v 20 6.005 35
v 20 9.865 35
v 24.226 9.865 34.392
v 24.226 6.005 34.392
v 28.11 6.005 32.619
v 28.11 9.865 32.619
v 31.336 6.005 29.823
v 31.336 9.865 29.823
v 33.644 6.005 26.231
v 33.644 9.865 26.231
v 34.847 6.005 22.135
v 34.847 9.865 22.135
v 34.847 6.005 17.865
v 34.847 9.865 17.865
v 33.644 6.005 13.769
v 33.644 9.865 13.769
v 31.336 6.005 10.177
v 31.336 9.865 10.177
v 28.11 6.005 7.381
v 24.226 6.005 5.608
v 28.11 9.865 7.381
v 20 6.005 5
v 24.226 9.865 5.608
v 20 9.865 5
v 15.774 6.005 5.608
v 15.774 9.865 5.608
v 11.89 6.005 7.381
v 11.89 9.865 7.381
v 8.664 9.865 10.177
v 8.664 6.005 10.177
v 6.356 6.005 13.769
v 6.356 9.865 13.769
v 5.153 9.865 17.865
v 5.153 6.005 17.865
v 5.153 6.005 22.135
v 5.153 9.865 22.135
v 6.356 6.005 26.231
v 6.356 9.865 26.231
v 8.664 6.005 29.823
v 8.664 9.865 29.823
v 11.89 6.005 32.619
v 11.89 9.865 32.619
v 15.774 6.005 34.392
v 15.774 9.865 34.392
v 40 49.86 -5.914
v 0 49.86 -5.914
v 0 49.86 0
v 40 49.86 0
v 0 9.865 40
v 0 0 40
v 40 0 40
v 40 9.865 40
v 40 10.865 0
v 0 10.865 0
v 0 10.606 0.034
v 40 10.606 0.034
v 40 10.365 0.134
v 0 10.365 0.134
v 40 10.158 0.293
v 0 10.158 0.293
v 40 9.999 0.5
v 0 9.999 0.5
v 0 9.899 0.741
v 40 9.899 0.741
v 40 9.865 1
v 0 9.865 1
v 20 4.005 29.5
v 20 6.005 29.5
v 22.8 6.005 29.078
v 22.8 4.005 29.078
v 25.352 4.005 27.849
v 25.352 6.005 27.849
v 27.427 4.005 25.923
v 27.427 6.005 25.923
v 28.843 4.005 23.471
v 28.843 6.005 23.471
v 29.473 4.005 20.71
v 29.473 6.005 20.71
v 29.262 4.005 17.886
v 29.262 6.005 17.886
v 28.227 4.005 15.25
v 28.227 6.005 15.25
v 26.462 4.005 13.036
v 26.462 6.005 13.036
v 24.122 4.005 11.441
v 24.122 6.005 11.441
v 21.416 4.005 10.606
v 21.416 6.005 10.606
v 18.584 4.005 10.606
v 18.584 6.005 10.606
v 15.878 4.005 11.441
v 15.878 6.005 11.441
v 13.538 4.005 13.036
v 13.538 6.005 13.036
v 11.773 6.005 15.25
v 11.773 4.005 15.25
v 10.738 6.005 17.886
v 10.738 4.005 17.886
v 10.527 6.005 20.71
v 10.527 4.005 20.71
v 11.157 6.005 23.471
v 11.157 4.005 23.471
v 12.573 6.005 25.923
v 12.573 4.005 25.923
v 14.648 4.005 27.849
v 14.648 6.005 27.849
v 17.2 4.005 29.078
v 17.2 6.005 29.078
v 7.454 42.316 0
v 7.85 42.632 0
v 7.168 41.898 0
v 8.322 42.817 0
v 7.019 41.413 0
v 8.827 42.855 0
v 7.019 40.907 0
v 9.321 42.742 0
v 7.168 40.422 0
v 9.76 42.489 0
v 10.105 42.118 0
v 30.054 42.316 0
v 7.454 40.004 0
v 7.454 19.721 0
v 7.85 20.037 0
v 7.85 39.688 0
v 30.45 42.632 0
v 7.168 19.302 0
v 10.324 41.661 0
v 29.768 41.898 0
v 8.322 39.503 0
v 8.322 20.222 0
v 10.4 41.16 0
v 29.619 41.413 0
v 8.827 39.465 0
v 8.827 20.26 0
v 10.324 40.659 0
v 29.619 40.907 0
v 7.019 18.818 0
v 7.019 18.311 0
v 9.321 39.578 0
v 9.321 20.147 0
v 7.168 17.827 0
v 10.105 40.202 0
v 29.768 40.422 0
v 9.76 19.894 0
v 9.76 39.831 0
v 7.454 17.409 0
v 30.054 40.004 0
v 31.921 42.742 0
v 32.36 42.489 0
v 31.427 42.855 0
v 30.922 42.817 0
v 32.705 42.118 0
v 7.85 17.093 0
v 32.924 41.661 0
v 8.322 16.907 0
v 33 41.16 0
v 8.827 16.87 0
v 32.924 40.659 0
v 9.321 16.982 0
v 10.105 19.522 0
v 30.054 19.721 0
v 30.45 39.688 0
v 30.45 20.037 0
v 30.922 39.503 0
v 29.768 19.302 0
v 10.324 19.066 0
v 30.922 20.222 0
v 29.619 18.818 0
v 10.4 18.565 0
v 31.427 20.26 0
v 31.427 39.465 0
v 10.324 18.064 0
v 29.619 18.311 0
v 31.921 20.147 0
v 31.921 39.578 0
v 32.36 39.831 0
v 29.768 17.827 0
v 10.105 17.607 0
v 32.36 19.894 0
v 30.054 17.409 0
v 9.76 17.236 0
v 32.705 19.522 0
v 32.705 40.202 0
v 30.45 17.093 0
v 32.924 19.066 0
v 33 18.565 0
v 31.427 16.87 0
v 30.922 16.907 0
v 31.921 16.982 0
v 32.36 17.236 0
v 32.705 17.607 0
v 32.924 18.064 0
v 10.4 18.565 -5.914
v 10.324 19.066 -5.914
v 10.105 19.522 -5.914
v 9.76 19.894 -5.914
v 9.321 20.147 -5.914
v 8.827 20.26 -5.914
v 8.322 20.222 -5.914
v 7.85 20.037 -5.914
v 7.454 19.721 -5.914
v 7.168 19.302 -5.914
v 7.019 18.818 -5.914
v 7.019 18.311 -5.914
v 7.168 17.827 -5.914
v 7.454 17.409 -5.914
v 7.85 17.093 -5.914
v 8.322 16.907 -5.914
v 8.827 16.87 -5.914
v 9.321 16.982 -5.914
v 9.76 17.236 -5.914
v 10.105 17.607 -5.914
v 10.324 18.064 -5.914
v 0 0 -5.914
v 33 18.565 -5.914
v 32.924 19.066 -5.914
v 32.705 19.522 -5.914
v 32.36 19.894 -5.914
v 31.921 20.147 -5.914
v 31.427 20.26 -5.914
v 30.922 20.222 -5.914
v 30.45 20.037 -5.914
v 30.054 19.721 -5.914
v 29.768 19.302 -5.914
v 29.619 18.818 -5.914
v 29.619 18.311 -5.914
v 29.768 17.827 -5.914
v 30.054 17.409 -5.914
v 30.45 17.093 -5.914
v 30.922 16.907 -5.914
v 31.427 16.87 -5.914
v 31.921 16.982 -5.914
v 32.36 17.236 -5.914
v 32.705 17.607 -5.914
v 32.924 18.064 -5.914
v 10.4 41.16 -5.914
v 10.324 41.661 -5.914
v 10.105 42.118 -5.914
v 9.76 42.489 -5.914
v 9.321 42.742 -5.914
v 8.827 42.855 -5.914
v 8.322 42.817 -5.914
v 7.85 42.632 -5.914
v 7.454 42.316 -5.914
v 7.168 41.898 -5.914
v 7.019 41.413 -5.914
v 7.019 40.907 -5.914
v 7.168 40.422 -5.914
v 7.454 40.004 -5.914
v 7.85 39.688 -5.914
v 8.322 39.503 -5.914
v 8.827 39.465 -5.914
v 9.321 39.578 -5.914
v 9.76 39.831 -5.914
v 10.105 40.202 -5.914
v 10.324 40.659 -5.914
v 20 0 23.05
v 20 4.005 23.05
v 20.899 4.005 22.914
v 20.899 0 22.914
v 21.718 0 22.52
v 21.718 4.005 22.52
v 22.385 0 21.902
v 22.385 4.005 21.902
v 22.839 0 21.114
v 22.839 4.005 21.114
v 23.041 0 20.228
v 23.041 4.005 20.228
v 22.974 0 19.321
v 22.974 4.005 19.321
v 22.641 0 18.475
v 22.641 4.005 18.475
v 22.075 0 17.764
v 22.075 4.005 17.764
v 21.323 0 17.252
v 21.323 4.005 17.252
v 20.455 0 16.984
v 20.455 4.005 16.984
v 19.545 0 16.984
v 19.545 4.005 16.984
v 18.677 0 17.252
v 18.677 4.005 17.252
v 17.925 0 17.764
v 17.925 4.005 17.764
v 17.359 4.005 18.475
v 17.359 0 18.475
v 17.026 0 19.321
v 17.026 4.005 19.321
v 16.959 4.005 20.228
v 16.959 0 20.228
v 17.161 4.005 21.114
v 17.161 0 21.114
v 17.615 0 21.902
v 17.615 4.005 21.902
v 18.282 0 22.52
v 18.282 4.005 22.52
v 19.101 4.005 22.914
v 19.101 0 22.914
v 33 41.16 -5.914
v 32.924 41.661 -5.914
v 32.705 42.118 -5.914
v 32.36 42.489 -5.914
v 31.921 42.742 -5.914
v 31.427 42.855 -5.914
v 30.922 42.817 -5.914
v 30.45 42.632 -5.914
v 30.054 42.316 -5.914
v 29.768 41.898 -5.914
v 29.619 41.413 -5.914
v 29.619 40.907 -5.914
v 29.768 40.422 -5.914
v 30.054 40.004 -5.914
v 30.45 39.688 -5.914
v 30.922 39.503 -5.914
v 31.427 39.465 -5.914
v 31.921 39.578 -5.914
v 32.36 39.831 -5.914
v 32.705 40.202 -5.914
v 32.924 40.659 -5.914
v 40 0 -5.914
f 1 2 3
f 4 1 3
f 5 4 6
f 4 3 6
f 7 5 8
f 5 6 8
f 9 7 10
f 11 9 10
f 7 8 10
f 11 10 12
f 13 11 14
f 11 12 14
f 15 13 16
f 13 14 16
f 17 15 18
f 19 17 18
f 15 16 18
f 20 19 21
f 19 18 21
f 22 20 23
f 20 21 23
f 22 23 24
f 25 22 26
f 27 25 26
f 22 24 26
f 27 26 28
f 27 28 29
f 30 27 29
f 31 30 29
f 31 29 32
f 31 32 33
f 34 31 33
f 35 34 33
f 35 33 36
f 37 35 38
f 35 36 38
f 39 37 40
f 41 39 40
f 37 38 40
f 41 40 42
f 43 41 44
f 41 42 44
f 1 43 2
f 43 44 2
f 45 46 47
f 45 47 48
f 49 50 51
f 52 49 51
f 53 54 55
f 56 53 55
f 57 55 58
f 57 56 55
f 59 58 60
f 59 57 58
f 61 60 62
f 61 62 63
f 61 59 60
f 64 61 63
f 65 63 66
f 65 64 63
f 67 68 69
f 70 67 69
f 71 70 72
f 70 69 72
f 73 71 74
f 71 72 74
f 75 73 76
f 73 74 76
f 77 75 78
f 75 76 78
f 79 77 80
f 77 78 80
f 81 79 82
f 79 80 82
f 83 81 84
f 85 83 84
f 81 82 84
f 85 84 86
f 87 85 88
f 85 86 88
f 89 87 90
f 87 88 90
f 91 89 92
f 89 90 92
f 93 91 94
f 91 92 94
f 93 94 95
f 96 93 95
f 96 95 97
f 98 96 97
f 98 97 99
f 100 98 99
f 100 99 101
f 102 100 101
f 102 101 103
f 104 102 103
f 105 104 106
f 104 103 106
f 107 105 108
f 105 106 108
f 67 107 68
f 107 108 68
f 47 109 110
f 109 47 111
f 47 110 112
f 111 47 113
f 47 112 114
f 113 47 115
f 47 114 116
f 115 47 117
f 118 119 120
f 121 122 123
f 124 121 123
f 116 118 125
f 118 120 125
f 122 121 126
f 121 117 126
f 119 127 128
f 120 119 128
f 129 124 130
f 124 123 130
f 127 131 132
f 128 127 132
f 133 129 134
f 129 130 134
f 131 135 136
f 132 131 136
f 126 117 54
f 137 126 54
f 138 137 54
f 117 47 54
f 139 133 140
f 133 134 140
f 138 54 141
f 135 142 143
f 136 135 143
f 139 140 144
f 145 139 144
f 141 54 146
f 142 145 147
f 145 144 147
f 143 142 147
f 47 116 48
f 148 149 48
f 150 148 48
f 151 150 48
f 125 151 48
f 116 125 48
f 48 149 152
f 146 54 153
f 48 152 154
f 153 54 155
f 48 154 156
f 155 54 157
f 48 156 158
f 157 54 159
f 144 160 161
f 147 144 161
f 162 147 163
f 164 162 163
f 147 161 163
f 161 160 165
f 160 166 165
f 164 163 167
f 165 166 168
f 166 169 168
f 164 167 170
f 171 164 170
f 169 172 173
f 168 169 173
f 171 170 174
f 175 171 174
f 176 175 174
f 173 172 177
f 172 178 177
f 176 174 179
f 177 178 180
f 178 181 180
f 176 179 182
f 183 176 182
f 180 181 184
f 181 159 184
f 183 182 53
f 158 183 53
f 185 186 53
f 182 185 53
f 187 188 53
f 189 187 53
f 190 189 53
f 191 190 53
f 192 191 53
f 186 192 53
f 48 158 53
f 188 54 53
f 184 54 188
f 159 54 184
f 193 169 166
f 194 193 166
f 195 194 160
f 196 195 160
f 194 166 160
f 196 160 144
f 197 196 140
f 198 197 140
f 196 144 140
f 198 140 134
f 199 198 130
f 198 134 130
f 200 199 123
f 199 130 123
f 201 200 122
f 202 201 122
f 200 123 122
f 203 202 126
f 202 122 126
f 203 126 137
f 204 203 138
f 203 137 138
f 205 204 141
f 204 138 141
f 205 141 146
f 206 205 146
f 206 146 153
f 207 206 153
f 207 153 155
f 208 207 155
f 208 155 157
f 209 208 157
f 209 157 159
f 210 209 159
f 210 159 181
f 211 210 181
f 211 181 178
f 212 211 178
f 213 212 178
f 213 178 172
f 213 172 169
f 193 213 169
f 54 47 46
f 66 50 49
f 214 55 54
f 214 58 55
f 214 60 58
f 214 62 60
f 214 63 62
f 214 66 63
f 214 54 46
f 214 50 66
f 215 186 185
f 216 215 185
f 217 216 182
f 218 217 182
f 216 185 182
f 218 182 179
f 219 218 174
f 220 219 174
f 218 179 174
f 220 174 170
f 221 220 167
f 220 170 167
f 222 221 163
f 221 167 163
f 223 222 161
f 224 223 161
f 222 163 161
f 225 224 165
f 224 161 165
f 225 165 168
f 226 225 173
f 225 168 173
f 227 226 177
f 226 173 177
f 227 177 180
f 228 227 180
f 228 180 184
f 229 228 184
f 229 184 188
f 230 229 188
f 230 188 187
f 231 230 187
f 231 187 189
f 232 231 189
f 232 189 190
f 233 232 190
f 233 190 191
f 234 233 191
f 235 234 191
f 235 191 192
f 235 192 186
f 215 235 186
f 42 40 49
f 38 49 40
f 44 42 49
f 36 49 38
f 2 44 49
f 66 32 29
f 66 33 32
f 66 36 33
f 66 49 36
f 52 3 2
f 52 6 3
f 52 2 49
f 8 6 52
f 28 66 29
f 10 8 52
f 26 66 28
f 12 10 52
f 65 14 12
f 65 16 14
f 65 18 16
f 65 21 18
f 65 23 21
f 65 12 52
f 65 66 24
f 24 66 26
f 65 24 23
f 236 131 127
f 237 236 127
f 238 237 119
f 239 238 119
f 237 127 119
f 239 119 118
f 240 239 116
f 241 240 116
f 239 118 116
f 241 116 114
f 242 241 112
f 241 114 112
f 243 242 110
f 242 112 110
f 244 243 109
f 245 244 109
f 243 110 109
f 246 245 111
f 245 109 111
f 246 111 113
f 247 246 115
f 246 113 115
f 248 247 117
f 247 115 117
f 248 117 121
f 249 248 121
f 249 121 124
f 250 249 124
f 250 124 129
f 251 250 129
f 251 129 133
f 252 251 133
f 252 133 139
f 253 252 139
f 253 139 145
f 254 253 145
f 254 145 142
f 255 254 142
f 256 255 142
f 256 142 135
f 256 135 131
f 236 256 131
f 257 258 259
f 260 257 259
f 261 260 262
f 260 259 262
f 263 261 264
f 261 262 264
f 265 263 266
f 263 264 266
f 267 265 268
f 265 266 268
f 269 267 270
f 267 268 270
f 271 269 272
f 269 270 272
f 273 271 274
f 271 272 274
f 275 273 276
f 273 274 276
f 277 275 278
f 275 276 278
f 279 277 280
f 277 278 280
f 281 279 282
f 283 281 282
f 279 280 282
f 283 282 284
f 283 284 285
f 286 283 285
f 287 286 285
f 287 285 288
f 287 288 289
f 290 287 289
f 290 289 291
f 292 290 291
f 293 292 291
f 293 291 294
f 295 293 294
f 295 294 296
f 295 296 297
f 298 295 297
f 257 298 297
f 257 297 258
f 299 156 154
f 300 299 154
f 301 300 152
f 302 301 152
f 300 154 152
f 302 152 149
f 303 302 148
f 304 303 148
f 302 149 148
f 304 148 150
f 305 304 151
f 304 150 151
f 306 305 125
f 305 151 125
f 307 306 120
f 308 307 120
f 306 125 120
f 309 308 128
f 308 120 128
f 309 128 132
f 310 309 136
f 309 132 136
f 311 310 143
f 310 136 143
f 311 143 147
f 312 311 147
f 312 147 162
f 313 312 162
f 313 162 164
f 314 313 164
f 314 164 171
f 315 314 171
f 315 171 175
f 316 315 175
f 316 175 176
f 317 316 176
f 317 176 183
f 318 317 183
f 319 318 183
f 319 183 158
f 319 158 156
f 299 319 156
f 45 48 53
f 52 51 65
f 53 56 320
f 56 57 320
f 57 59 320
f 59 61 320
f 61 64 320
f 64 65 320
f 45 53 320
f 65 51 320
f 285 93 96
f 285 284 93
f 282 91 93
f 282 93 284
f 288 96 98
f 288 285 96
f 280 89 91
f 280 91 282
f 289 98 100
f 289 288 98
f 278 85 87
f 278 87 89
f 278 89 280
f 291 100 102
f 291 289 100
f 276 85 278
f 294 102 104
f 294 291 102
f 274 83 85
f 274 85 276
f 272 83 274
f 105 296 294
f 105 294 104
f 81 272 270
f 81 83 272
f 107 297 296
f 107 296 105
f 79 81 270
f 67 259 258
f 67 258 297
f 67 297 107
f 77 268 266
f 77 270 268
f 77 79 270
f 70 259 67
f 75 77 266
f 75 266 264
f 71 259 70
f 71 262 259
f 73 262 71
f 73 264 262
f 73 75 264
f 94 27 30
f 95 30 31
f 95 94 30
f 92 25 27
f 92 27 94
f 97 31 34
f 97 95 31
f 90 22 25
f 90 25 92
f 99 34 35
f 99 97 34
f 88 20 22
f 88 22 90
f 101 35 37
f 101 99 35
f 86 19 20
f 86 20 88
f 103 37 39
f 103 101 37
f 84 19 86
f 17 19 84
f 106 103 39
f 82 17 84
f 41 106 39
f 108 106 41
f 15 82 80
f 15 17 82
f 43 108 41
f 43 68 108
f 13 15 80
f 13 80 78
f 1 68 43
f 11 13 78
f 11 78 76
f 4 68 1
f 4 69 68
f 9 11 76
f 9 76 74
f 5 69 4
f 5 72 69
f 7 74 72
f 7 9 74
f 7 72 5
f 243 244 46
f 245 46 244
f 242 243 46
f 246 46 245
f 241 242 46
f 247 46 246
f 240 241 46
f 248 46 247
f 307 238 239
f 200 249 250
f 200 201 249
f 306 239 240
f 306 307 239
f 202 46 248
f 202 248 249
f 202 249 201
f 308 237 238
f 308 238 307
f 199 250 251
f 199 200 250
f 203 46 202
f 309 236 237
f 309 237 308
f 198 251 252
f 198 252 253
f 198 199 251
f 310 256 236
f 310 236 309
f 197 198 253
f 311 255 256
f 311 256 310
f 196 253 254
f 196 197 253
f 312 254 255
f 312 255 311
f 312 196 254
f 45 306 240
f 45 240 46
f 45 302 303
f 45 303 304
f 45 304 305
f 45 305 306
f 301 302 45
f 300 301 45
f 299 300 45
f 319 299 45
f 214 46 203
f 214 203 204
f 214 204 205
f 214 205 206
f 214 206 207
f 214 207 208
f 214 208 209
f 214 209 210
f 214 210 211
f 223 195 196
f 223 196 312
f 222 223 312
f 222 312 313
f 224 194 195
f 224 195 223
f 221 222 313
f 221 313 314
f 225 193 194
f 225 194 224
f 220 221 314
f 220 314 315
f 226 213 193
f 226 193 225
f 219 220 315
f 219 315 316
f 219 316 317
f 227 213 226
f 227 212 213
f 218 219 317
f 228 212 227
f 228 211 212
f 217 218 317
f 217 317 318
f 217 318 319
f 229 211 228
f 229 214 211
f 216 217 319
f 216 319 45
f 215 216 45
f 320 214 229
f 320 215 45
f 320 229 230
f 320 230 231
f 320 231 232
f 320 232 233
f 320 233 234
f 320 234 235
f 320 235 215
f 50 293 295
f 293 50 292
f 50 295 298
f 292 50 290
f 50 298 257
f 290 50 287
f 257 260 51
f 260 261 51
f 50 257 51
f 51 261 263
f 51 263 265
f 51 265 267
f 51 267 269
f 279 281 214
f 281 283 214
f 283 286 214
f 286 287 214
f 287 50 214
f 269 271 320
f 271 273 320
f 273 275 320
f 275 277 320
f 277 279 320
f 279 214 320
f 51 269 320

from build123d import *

# Parameters (mm, degrees)
SKETCH1_W           = 40
SKETCH1_H           = 40
BOSS_EXTRUDE1_DEPTH = 9.864848297
SKETCH2_R           = 15
CUT_EXTRUDE1_DEPTH  = 3.86
SKETCH3_R           = 9.5
CUT_EXTRUDE2_DEPTH  = 2
SKETCH4_R           = 3.05
CUT_EXTRUDE3_DEPTH  = 57.871254602
SKETCH5_W           = 40
SKETCH5_H           = 5.913501164
BOSS_EXTRUDE3_DEPTH = 49.86
SKETCH7_R           = 1.7
CUT_EXTRUDE4_DEPTH  = 76.40570005
FILLET2_R           = 1


with BuildPart() as part:
    # Sketch1 → Boss-Extrude1 (new body)
    with BuildSketch(Plane(origin=(0, 0, 0), x_dir=(1, 0, 0), z_dir=(0, 1, 0))):
        with Locations((20, -20)):
            Rectangle(SKETCH1_W, SKETCH1_H)
    extrude(amount=BOSS_EXTRUDE1_DEPTH)

    # Sketch2 → Cut-Extrude1 (cut)
    with BuildSketch(Plane(origin=(0, 9.864848297, 0), x_dir=(1, 0, 0), z_dir=(0, 1, 0))):
        with Locations(Location((20, -20, 0), (0, 0, 270))):
            Circle(SKETCH2_R)
    extrude(amount=-CUT_EXTRUDE1_DEPTH, mode=Mode.SUBTRACT)

    # Sketch3 → Cut-Extrude2 (cut)
    with BuildSketch(Plane(origin=(0, 6.004848297, 0), x_dir=(1, 0, 0), z_dir=(0, 1, 0))):
        with Locations(Location((20, -20, 0), (0, 0, 270))):
            Circle(SKETCH3_R)
    extrude(amount=-CUT_EXTRUDE2_DEPTH, mode=Mode.SUBTRACT)

    # Sketch4 → Cut-Extrude3 (cut, through all)
    with BuildSketch(Plane(origin=(0, 4.004848297, 0), x_dir=(1, 0, 0), z_dir=(0, 1, 0))):
        with Locations(Location((20, -20, 0), (0, 0, 270))):
            Circle(SKETCH4_R)
    extrude(amount=-CUT_EXTRUDE3_DEPTH, mode=Mode.SUBTRACT)

    # Sketch5 → Boss-Extrude3 (add)
    with BuildSketch(Plane(origin=(0, 0, 0), x_dir=(1, 0, 0), z_dir=(0, 1, 0))):
        with Locations((20, 2.956750582)):
            Rectangle(SKETCH5_W, SKETCH5_H)
    extrude(amount=BOSS_EXTRUDE3_DEPTH)

    # Sketch7 → Cut-Extrude4 (cut, through all)
    with BuildSketch(Plane.XY):
        with Locations((8.7, 18.564848297)):
            Circle(SKETCH7_R)
        with Locations((31.3, 18.564848297)):
            Circle(SKETCH7_R)
        with Locations((31.3, 41.16)):
            Circle(SKETCH7_R)
        with Locations((8.7, 41.16)):
            Circle(SKETCH7_R)
    extrude(amount=-CUT_EXTRUDE4_DEPTH, mode=Mode.SUBTRACT)

    # Fillet2
    fillet2_edges = [part.edges().sort_by_distance(p)[0] for p in [
        (20, 9.864848297, 0),
    ]]
    fillet(fillet2_edges, radius=FILLET2_R)


solid = part.part
